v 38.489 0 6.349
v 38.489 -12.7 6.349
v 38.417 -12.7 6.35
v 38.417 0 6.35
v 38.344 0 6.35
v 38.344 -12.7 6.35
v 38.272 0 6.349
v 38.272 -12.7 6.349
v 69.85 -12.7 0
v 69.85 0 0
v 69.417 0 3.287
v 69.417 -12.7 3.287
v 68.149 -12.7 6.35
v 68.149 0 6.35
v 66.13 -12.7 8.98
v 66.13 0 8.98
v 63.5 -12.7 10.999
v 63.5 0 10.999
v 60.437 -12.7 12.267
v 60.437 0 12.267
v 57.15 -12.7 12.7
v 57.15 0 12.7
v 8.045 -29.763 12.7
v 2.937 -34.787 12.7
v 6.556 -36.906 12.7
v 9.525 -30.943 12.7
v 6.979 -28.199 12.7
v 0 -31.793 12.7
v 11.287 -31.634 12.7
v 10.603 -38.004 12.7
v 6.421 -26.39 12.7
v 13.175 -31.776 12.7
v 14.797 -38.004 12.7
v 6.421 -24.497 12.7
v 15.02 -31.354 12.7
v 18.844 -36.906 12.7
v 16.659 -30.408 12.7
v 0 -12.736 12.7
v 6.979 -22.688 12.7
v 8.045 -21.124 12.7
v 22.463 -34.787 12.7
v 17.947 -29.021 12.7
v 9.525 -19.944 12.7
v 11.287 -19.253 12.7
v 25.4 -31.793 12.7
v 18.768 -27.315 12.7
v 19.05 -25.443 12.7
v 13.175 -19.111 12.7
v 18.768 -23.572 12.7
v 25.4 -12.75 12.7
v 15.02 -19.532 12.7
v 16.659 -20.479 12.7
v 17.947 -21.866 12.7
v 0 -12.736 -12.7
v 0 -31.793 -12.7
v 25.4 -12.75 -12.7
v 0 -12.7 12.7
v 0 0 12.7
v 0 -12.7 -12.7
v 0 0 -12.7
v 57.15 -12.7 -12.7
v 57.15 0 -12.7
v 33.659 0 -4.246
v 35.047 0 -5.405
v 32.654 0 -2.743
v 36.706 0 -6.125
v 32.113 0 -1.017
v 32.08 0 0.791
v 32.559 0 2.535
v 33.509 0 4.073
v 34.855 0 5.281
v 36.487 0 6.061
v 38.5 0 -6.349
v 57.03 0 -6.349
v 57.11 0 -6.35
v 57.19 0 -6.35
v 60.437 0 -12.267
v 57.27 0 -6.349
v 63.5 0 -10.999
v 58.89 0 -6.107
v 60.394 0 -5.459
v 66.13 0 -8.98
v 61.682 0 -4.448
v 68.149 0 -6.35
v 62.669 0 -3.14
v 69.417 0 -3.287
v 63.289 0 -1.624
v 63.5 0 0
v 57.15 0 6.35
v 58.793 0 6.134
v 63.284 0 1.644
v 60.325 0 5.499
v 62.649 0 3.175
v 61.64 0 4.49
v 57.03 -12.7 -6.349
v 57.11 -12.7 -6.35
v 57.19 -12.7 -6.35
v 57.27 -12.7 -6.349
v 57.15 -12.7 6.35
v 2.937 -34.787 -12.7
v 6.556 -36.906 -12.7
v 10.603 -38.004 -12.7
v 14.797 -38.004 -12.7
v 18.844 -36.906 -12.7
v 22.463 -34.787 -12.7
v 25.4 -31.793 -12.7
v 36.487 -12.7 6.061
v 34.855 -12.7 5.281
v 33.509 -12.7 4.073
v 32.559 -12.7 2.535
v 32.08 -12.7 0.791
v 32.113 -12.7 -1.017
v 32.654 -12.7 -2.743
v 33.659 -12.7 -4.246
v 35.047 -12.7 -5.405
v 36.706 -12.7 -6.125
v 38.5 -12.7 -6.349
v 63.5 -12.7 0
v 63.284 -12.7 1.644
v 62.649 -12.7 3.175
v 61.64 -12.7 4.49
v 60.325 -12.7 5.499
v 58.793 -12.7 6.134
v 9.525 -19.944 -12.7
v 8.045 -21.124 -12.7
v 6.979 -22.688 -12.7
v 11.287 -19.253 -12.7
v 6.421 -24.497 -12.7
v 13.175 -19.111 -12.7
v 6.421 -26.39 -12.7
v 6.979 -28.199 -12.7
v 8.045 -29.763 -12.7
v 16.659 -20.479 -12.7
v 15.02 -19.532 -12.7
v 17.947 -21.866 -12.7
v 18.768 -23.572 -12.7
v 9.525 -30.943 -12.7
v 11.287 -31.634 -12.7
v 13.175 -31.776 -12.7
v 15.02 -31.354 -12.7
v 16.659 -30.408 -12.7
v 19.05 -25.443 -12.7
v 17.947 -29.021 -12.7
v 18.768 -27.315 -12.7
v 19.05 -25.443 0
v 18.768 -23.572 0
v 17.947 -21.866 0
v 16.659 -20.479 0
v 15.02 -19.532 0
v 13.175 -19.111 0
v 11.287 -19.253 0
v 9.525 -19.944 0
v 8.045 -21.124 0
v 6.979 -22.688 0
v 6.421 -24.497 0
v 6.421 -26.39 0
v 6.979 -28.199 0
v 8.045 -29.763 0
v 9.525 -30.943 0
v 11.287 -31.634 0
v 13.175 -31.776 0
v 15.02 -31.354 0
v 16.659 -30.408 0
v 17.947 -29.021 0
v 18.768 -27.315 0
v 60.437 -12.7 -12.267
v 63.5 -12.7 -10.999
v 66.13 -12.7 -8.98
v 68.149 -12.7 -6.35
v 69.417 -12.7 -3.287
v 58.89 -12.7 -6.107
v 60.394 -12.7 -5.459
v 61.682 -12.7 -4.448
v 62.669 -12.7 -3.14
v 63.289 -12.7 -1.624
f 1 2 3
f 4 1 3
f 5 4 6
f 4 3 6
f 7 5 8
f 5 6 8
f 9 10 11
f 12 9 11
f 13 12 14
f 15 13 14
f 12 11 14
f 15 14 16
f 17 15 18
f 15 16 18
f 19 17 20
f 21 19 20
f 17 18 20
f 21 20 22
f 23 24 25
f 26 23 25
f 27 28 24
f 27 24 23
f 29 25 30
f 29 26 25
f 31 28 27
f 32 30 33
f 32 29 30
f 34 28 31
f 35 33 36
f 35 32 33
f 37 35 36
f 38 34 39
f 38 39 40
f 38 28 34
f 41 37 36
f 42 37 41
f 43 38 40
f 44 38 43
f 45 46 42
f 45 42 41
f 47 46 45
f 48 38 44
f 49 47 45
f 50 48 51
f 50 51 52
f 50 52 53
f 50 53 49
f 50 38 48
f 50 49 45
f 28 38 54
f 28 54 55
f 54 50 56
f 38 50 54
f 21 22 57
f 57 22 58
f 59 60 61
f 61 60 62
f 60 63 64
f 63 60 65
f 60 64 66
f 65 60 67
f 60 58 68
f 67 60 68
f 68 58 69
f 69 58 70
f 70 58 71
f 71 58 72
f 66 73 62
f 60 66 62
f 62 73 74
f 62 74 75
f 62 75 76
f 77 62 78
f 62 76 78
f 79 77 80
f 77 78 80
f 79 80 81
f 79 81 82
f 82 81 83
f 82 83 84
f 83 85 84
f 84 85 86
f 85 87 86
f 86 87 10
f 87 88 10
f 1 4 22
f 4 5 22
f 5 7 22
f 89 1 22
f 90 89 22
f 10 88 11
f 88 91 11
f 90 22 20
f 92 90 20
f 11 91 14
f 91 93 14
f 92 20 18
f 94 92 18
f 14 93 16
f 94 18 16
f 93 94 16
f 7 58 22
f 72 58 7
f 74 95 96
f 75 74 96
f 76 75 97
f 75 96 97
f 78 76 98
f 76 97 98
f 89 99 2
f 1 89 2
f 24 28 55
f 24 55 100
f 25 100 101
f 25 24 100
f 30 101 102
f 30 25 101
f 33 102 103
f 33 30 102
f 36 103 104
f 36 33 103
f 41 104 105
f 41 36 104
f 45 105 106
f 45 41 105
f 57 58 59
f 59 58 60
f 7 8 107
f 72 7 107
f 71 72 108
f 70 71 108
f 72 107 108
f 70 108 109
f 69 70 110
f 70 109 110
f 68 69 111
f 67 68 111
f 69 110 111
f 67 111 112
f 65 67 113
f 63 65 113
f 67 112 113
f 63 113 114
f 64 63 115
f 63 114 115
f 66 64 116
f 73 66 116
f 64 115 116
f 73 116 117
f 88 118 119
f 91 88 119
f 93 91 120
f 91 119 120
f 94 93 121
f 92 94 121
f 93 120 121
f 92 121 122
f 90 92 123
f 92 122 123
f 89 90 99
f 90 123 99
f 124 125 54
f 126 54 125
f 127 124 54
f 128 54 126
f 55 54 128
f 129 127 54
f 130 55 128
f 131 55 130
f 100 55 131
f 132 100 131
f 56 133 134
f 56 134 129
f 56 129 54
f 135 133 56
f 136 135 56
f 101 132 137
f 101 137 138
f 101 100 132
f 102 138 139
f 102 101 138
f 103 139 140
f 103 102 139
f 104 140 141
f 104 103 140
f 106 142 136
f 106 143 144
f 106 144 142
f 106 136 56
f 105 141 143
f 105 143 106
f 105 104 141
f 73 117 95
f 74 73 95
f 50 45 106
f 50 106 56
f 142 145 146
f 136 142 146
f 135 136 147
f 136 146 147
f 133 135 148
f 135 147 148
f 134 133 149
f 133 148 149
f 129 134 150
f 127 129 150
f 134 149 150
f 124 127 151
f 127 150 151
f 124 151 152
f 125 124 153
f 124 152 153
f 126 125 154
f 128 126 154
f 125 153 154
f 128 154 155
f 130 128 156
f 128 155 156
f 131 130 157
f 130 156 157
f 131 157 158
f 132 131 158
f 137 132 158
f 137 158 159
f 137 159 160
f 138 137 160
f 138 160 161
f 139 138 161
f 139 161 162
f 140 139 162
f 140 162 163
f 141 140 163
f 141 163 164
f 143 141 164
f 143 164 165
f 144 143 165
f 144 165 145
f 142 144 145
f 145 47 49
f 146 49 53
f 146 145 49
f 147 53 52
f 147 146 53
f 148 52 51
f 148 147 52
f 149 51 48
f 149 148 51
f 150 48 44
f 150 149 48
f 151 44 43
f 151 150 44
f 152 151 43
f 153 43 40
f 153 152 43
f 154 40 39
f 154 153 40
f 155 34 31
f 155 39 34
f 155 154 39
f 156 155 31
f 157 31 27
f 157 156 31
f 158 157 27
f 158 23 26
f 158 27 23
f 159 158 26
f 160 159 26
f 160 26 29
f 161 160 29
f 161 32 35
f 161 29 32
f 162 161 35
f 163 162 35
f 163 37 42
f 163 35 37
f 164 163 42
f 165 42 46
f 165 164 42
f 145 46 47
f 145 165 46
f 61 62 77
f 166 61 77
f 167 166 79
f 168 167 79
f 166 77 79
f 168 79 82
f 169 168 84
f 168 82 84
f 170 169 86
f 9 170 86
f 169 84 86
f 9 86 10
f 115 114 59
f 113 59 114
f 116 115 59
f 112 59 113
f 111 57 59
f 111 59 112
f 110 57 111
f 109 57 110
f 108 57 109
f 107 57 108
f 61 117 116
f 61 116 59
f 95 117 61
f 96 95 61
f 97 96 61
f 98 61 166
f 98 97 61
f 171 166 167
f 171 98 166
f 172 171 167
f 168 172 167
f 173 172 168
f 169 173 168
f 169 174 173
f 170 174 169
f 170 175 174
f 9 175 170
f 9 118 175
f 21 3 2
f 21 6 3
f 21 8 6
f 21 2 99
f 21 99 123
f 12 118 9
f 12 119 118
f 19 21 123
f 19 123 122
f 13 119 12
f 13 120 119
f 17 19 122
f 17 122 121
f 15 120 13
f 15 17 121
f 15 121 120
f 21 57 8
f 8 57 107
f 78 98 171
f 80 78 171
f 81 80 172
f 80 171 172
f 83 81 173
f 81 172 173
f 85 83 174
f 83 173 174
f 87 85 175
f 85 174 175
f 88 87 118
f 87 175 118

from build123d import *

# Parameters (mm, degrees)
F1_DEPTH  = 12.7
F3_DEPTH  = 12.7
F4_DEPTH  = 12.7
F5_DEPTH  = 25.4
F6_DEPTH  = 12.7
F8_DEPTH  = 12.7
F10_DEPTH = 12.701
F11_R     = 6.35
F12_DEPTH = 12.701
F13_R     = 6.35
F14_DEPTH = 12.701
F15_DEPTH = 12.701


with BuildPart() as f1:
    # F0 (on Front) → F1 (new body)
    with BuildSketch(Plane.XZ):
        with BuildLine():
            ThreePointArc((57.15, -12.7), (66.1302561211, -8.9802561211), (69.85, 0))
            ThreePointArc((69.85, 0), (66.1302561211, 8.9802561211), (57.15, 12.7))
            ThreePointArc((57.15, 12.7), (44.45, 0), (57.15, -12.7))
        make_face()
        with BuildLine():
            ThreePointArc((57.15, -12.7), (44.45, 0), (57.15, 12.7))
            Line((57.15, 12.7), (0, 12.7))
            Line((0, 12.7), (0, -12.7))
            Line((0, -12.7), (57.15, -12.7))
        make_face()
    extrude(amount=F1_DEPTH)

    # F9 (on face) → F10 (cut, through all)
    with BuildSketch(Plane.XZ.offset(12.7)):
        with BuildLine():
            ThreePointArc((57.2695409589, -6.3488747002), (61.6821951133, -4.4476631455), (63.5, 0))
            ThreePointArc((63.5, 0), (61.640016598, 4.4902395203), (57.1496847402, 6.3499999922))
            ThreePointArc((57.1496847402, 6.3499999922), (50.8002798493, 0.0596155047), (57.0304590411, -6.3488747002))
            Line((57.0304590411, -6.3488747002), (57.2695409589, -6.3488747002))
        make_face()
        with BuildLine():
            ThreePointArc((57.0304590411, -6.3488747002), (50.8002798493, 0.0596155047), (57.1496847402, 6.3499999922))
            Line((57.1496847402, 6.3499999922), (38.4893314074, 6.3490735576))
            ThreePointArc((38.4893314074, 6.3490735576), (42.909179354, 4.4516142219), (44.7308650076, 0))
            ThreePointArc((44.7308650076, 0), (42.9130601209, -4.4476631455), (38.5004059666, -6.3488747002))
            Line((38.5004059666, -6.3488747002), (57.0304590411, -6.3488747002))
        make_face()
        with BuildLine():
            ThreePointArc((57.0304590411, -6.3488747002), (57.15, -6.35), (57.2695409589, -6.3488747002))
            Line((57.2695409589, -6.3488747002), (57.0304590411, -6.3488747002))
        make_face()
        with BuildLine():
            Line((38.2717681808, 6.3490627562), (38.4893314074, 6.3490735576))
            ThreePointArc((38.4893314074, 6.3490735576), (38.3805497478, 6.3499999922), (38.2717681808, 6.3490627562))
        make_face()
        with BuildLine():
            ThreePointArc((44.7308650076, 0), (42.909179354, 4.4516142219), (38.4893314074, 6.3490735576))
            Line((38.4893314074, 6.3490735576), (38.2717681808, 6.3490627562))
            ThreePointArc((38.2717681808, 6.3490627562), (32.0318941318, -0.1143189316), (38.5004059666, -6.3488747002))
            ThreePointArc((38.5004059666, -6.3488747002), (42.9130601209, -4.4476631455), (44.7308650076, 0))
        make_face()
    extrude(amount=-F10_DEPTH, mode=Mode.SUBTRACT)

    # F13 (on Top) → F14 (cut, through all)
    with BuildSketch(Plane.XY):
        with Locations((12.7, -25.4434416966)):
            Circle(F13_R)
    extrude(amount=-F14_DEPTH, mode=Mode.SUBTRACT)


with BuildPart() as f3:
    # F2 (on Top) → F3 (new body)
    with BuildSketch(Plane.XY):
        Polygon((25.4, -12.7495970972), (0, -12.7362702521), (0, -31.7934416966), (25.4, -31.7934416966), align=None)
        with BuildLine():
            Line((25.4, -31.7934416966), (0, -31.7934416966))
            ThreePointArc((0, -31.7934416966), (12.7, -38.1434416966), (25.4, -31.7934416966))
        make_face()
    extrude(amount=F3_DEPTH)

    # F4 (add): a face of the model
    f4_faces = [f3.faces().sort_by_distance(p)[0] for p in [
        (12.6987990519, -24.5571554059, 0),
    ]]
    extrude(f4_faces, amount=F4_DEPTH)

    # F2 (on Top) → F5 (join)
    with BuildSketch(Plane.XY):
        Polygon((25.4, -12.7495970972), (0, -12.7362702521), (0, -31.7934416966), (25.4, -31.7934416966), align=None)
        with BuildLine():
            Line((25.4, -31.7934416966), (0, -31.7934416966))
            ThreePointArc((0, -31.7934416966), (12.7, -38.1434416966), (25.4, -31.7934416966))
        make_face()
    extrude(amount=-F5_DEPTH)

    # F2 (on Top) → F6 (join)
    with BuildSketch(Plane.XY):
        Polygon((25.4, -12.7495970972), (0, -12.7362702521), (0, -31.7934416966), (25.4, -31.7934416966), align=None)
        with BuildLine():
            Line((25.4, -31.7934416966), (0, -31.7934416966))
            ThreePointArc((0, -31.7934416966), (12.7, -38.1434416966), (25.4, -31.7934416966))
        make_face()
    extrude(amount=-F6_DEPTH)

    # F7 (on face) → F8 (cut)
    with BuildSketch(Plane(origin=(0, 0, -25.4), x_dir=(1, 0, 0), z_dir=(0, 0, -1))):
        with BuildLine():
            Line((0, 12.7362702521), (25.4, 12.7495970972))
            Line((25.4, 12.7495970972), (25.4, 31.7934416966))
            ThreePointArc((25.4, 31.7934416966), (12.7, 38.1434416966), (0, 31.7934416966))
            Line((0, 31.7934416966), (0, 12.7362702521))
        make_face()
    extrude(amount=-F8_DEPTH, mode=Mode.SUBTRACT)

    # F11 (on Top) → F12 (cut, through all)
    with BuildSketch(Plane.XY):
        with Locations((12.7, -25.4434416966)):
            Circle(F11_R)
    extrude(amount=-F12_DEPTH, mode=Mode.SUBTRACT)

    # F13 (on Top) → F15 (cut, through all)
    with BuildSketch(Plane.XY):
        with Locations((12.7, -25.4434416966)):
            Circle(F13_R)
    extrude(amount=F15_DEPTH, mode=Mode.SUBTRACT)


solid = Compound([f1.part, f3.part])
